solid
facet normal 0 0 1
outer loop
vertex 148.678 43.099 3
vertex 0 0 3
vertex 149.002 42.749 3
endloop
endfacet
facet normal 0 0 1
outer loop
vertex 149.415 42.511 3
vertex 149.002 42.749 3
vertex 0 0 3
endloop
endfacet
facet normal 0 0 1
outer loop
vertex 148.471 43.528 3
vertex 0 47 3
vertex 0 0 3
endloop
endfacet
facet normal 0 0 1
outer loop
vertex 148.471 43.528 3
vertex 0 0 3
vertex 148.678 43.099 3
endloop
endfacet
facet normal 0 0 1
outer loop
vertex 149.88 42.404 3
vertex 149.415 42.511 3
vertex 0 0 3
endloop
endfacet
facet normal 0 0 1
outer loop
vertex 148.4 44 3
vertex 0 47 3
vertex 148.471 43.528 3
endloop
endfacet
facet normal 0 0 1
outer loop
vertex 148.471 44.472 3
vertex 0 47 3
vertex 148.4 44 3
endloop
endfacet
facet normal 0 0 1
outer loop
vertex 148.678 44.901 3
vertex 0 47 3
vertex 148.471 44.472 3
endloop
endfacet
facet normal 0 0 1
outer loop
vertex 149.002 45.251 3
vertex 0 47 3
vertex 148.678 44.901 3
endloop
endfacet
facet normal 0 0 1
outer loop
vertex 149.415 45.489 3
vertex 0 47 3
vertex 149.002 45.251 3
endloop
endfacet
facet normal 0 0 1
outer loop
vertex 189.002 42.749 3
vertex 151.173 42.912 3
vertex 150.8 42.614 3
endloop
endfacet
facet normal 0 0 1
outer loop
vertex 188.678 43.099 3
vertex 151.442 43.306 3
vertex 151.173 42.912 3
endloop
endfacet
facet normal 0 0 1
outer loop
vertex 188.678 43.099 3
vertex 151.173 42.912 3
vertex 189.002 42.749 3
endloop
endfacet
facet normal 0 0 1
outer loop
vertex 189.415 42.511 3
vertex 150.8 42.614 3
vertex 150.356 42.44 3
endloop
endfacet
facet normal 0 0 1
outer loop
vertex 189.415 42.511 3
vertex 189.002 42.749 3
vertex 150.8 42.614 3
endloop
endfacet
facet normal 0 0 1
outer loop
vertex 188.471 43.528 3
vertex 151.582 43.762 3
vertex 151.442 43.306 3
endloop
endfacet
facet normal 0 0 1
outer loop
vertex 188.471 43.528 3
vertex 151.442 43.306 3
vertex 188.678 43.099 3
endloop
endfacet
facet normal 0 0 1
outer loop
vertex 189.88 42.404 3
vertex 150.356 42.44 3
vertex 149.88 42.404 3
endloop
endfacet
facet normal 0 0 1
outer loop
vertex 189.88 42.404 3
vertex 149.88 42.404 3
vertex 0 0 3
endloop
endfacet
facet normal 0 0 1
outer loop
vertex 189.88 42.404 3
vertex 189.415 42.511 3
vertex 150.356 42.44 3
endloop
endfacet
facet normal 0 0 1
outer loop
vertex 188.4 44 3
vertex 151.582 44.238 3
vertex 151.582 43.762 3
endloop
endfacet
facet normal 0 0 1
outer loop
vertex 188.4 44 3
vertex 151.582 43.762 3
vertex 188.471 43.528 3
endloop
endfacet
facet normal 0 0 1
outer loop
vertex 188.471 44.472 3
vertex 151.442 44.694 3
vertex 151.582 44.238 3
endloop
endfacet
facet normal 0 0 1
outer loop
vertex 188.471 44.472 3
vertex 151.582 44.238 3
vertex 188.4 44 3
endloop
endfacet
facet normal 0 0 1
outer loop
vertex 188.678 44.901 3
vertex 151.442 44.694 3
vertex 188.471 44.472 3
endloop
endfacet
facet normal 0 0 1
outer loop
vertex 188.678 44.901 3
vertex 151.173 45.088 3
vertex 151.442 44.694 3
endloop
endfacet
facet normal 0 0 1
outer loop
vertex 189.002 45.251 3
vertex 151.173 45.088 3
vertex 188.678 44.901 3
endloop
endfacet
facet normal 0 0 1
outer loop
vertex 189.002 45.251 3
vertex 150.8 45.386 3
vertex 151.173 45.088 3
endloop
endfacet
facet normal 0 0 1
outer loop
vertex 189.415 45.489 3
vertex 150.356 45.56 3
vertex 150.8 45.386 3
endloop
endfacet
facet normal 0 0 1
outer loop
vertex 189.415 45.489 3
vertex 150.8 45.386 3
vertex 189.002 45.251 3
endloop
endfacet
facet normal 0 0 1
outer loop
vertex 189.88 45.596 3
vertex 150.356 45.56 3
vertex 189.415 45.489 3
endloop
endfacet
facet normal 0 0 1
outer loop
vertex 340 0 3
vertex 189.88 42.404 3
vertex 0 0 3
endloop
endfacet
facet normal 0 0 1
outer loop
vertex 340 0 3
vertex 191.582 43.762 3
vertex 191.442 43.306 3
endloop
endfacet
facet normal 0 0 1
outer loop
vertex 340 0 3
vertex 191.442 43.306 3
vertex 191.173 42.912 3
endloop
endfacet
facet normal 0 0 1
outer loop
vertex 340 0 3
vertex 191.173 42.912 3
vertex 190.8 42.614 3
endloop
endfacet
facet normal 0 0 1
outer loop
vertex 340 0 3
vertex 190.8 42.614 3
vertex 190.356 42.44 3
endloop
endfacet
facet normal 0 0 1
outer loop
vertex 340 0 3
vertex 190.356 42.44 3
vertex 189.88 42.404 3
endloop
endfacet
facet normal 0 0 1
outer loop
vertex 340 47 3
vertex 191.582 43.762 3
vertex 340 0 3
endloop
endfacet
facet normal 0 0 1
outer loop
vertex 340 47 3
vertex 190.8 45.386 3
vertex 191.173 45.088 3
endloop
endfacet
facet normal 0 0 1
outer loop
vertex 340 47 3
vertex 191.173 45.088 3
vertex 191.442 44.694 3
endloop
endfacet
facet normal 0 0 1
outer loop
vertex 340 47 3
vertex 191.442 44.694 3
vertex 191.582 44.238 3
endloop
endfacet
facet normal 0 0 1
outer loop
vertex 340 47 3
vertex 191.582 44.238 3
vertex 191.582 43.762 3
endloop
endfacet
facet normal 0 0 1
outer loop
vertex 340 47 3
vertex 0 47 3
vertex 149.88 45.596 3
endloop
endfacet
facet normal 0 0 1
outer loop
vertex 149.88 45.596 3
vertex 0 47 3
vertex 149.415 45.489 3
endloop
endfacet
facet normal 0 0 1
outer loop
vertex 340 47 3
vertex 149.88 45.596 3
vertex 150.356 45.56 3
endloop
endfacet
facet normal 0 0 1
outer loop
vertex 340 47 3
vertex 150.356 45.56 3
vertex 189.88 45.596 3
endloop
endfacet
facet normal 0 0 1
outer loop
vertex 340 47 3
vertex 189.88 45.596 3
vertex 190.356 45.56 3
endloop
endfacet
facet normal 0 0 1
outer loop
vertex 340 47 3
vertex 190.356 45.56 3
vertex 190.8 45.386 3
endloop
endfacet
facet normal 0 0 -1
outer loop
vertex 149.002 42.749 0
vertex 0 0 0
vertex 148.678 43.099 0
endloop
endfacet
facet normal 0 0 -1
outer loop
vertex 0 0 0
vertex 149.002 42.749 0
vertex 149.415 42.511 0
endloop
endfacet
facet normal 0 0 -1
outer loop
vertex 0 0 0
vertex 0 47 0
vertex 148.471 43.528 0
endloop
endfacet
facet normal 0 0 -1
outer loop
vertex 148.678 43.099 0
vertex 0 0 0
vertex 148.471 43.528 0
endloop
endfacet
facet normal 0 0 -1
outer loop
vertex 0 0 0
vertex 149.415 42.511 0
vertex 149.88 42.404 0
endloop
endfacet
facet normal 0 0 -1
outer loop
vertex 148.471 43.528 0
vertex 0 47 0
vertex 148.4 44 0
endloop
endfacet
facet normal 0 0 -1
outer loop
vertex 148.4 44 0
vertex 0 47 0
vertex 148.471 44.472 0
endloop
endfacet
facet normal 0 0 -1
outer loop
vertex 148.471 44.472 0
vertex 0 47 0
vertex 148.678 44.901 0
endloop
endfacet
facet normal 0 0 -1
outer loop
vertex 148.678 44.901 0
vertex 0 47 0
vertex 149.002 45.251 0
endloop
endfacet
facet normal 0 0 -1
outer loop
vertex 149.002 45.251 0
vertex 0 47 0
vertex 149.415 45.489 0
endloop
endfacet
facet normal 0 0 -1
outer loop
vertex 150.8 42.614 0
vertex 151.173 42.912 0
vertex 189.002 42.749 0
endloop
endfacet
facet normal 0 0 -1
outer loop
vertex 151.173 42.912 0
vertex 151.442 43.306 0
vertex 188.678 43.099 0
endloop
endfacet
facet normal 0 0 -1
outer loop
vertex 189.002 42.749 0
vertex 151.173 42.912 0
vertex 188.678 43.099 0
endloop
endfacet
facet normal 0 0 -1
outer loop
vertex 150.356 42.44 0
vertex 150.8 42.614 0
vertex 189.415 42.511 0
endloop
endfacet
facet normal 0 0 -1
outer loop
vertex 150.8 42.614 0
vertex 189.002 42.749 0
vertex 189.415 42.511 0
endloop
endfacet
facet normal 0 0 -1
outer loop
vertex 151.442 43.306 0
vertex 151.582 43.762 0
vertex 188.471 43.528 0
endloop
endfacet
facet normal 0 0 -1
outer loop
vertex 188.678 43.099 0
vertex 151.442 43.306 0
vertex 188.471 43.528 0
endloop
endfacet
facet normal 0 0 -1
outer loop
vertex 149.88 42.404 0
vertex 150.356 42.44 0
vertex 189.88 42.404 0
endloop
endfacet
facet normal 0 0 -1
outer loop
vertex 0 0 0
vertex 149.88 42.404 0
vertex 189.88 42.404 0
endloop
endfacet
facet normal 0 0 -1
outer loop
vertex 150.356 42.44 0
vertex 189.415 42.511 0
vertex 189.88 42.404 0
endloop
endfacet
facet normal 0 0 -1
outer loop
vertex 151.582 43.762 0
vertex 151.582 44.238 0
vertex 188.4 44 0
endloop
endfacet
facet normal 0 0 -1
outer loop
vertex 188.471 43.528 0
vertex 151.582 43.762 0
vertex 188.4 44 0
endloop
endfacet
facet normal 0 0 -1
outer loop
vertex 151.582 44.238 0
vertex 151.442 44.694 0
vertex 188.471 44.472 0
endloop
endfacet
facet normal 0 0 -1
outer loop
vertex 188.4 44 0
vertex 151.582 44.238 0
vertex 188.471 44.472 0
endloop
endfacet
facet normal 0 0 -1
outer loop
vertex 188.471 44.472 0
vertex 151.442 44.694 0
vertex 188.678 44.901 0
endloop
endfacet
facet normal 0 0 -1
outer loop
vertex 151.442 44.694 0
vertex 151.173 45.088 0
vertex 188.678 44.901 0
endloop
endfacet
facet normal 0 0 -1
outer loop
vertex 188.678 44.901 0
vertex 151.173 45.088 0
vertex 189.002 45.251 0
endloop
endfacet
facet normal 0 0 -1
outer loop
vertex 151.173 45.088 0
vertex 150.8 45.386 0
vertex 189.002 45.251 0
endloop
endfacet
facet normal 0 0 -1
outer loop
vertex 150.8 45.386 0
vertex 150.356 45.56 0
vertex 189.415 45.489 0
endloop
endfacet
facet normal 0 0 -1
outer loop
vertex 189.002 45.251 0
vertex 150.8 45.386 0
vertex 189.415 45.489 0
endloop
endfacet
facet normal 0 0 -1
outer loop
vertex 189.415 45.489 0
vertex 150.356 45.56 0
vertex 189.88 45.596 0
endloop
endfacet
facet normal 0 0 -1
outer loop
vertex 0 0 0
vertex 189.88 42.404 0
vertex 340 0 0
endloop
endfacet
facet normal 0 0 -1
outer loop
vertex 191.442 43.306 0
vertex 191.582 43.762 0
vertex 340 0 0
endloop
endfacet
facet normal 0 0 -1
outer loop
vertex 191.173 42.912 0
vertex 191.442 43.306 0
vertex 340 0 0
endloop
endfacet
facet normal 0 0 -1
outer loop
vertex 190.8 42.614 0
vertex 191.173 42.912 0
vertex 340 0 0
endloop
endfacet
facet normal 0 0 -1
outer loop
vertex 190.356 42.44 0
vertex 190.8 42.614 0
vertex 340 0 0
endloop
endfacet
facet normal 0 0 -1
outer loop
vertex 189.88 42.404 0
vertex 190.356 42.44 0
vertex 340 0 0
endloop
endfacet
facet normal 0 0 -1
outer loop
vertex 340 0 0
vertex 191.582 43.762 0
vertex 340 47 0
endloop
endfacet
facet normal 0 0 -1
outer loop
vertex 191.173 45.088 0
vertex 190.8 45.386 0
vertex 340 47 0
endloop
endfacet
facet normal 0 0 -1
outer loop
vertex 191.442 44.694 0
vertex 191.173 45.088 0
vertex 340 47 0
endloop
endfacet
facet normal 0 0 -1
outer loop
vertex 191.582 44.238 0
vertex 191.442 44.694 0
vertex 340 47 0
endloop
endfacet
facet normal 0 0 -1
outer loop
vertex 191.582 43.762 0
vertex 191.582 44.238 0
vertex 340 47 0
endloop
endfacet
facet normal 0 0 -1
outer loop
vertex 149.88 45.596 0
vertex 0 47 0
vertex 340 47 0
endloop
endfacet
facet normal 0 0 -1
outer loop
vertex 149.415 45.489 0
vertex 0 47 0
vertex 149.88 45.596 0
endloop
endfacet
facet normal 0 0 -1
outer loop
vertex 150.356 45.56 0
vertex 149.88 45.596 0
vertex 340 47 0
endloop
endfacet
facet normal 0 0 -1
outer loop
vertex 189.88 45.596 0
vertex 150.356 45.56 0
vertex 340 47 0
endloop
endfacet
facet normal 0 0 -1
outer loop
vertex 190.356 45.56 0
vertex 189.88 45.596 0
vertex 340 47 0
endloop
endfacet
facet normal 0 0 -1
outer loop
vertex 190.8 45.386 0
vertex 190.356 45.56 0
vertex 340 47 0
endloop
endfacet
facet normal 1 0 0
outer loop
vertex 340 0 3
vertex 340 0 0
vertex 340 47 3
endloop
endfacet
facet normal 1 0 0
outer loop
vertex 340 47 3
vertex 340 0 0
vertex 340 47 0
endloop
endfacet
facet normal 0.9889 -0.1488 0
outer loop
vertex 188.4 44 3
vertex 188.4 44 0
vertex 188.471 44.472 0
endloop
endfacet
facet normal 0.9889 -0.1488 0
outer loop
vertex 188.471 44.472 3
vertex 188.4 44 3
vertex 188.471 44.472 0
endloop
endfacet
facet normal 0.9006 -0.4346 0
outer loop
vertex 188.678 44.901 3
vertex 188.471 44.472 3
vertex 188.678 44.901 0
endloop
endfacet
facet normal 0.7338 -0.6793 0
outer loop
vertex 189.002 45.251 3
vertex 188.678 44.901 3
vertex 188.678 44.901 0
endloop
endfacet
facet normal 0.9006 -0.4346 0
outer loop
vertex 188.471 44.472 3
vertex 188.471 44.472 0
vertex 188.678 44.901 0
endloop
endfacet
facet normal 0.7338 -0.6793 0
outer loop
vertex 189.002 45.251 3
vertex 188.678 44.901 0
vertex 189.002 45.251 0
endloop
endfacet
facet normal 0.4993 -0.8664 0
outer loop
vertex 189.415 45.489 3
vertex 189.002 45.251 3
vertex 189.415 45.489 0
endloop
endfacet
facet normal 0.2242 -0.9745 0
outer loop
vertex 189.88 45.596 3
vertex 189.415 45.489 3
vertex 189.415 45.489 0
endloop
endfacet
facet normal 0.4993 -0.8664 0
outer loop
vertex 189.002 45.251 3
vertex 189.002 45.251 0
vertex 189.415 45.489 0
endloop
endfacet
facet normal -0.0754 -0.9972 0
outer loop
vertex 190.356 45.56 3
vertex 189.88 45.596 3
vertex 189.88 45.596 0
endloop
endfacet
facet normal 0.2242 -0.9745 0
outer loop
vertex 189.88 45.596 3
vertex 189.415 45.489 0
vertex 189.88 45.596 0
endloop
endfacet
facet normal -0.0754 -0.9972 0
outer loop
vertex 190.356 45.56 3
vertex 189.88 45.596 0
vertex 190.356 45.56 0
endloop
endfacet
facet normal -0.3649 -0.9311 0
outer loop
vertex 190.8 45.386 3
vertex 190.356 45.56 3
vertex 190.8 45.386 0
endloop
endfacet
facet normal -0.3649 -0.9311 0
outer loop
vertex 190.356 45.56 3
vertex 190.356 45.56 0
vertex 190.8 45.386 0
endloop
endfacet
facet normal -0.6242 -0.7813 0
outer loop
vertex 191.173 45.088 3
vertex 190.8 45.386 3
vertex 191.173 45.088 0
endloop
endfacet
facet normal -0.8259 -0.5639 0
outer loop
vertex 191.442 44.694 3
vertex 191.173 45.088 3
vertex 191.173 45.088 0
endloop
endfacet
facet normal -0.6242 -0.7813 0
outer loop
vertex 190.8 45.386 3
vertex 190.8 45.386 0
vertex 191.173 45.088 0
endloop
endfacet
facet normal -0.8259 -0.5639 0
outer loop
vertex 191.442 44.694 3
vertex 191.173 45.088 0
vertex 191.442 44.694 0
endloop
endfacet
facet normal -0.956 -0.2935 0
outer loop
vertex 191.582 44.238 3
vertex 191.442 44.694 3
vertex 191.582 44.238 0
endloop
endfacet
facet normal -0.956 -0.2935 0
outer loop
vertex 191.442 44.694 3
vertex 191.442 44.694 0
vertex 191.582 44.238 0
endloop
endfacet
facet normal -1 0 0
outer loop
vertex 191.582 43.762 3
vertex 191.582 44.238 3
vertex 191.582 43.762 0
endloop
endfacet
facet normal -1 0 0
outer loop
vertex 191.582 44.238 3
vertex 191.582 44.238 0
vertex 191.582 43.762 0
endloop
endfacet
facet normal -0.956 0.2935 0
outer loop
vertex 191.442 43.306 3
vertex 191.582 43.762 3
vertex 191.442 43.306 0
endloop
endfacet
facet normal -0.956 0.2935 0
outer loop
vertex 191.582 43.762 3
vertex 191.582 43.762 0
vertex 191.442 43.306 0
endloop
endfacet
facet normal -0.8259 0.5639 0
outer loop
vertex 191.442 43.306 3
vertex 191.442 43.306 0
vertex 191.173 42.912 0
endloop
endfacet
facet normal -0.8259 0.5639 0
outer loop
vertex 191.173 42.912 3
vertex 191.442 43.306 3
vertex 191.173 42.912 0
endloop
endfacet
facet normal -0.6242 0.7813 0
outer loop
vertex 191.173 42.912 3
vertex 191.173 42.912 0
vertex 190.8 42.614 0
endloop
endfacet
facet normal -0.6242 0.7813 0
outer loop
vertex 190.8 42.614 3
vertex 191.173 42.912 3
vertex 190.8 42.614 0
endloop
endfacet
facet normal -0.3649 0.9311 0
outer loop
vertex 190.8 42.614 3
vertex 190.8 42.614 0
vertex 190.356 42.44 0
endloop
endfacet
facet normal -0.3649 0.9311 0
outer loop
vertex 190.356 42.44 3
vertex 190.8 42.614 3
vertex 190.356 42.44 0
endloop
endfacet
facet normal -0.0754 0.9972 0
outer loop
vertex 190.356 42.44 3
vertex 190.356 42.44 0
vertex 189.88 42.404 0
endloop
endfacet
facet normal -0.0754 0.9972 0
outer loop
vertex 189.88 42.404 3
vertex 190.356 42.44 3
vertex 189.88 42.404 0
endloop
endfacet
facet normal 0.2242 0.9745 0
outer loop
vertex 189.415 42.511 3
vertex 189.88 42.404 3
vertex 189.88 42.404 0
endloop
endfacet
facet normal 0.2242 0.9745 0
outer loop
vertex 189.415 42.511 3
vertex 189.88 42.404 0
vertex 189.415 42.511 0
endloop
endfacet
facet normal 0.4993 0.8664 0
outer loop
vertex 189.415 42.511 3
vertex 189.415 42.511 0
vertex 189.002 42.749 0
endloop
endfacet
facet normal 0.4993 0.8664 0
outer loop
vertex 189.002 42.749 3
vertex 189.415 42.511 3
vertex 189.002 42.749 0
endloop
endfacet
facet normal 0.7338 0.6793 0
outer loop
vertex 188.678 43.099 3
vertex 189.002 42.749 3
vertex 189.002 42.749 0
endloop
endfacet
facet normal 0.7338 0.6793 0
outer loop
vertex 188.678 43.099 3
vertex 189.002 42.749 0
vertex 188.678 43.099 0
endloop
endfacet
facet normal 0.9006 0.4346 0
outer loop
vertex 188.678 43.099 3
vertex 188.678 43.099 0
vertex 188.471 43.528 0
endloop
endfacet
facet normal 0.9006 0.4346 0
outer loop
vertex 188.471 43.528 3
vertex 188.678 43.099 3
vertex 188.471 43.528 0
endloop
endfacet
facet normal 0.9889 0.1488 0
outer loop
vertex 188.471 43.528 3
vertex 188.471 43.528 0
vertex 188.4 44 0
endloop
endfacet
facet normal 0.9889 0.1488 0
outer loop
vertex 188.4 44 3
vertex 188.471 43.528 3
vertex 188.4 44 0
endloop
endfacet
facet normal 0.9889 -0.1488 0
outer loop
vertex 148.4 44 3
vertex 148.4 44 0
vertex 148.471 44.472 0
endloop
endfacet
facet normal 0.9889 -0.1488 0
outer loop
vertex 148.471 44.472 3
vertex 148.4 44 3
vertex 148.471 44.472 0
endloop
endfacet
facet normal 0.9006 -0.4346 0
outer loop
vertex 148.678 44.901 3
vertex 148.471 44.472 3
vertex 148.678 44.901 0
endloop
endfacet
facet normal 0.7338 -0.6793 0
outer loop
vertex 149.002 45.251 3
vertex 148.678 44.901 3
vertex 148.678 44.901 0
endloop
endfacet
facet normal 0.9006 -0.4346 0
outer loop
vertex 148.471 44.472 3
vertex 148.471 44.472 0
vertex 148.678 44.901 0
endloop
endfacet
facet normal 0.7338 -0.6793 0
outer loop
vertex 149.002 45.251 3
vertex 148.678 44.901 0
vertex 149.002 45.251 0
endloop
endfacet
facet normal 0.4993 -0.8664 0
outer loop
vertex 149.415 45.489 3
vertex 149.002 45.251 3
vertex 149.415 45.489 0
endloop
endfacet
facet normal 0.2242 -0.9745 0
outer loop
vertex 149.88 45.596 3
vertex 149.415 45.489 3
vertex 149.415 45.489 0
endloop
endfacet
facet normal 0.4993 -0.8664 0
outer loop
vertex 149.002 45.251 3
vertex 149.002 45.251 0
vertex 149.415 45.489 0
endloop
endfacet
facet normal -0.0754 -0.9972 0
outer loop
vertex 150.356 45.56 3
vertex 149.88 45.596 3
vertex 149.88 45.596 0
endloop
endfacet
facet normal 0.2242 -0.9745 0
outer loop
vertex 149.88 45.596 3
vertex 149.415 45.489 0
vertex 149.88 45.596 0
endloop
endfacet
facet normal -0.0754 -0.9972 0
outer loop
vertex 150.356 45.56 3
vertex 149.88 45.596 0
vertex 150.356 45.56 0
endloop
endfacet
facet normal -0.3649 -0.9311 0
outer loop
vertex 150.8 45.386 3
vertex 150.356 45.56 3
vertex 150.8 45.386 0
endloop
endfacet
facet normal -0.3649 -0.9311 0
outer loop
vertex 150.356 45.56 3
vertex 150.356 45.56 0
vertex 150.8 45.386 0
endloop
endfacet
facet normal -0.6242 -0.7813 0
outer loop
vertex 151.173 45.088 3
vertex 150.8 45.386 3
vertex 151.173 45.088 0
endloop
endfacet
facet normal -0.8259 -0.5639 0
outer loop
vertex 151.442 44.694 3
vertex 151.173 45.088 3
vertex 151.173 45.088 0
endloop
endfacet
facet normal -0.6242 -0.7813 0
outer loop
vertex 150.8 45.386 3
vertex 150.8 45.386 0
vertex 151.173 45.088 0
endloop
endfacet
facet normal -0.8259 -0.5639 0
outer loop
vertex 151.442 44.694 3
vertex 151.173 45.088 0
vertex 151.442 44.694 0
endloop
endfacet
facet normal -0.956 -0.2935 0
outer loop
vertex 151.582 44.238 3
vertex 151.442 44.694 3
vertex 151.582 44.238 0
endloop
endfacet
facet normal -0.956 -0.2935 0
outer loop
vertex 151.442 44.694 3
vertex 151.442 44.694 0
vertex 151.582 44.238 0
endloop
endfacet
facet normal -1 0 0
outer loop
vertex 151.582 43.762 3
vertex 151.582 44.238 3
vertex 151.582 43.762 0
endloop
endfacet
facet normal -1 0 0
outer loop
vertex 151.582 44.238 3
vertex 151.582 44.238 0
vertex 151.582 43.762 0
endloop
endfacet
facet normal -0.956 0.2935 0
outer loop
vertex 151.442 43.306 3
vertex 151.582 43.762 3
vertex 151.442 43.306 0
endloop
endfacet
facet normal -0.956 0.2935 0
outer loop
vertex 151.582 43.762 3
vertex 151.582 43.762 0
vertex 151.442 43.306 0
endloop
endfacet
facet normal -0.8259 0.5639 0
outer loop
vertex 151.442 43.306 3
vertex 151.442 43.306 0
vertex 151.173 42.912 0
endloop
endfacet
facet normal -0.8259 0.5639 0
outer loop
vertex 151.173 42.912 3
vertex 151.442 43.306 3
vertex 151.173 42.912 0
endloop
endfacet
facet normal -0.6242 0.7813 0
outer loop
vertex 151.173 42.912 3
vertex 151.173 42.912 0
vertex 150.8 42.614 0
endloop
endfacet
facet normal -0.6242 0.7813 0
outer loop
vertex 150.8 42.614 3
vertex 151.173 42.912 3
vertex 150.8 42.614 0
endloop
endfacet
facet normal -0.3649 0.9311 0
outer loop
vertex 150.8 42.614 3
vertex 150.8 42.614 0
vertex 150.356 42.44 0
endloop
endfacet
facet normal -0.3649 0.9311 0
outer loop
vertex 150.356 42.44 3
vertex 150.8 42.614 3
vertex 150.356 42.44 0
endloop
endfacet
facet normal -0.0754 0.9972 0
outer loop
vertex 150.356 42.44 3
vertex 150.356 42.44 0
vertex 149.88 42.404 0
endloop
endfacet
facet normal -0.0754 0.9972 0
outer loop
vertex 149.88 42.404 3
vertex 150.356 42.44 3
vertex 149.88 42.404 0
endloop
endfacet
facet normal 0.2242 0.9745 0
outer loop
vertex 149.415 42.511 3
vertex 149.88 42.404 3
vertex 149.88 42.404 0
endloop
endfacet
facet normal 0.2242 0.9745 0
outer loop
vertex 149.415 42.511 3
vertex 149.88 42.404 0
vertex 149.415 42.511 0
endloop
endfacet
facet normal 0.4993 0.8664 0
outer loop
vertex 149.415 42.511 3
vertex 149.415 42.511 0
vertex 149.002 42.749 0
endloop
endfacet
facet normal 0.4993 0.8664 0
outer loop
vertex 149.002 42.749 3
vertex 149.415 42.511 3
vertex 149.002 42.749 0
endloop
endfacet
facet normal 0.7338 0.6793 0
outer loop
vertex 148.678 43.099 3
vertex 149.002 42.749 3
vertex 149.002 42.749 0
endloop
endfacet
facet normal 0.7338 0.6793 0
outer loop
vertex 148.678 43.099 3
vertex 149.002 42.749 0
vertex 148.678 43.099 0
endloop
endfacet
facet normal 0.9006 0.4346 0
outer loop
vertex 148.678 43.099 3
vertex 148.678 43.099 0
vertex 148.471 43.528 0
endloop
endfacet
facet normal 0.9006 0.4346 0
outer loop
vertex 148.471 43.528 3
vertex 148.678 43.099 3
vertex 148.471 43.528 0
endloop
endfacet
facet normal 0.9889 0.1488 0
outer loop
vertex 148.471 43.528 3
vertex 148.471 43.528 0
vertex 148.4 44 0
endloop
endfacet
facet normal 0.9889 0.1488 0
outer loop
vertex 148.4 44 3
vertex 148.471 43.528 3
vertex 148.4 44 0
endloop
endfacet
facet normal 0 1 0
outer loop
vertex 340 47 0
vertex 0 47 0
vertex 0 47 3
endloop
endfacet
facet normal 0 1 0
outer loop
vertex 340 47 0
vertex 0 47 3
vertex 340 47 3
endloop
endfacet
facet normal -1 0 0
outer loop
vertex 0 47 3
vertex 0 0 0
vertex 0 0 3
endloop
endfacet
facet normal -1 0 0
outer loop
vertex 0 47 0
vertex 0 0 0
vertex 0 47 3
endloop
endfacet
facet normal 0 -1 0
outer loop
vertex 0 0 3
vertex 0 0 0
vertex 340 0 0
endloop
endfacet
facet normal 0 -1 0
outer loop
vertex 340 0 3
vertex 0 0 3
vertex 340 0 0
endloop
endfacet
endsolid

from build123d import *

# Parameters (mm, degrees)
SKETCH1_W           = 340
SKETCH1_H           = 47
BOSS_EXTRUDE1_DEPTH = 3
CUT_EXTRUDE1_REACH  = 345.246
SKETCH2_R           = 1.6


with BuildPart() as part:
    # Sketch1 → Boss-Extrude1 (new body)
    with BuildSketch(Plane.XY):
        with Locations((170, 23.5)):
            Rectangle(SKETCH1_W, SKETCH1_H)
    extrude(amount=BOSS_EXTRUDE1_DEPTH)

    # Sketch2 → Cut-Extrude1 (cut, up to next)
    with BuildSketch(Plane(origin=(0, 0, 0), x_dir=(-1, 0, 0), z_dir=(0, 0, -1)), mode=Mode.PRIVATE) as cut_extrude1_sk1:
        with Locations((-150, 44)):
            Circle(SKETCH2_R)
    cut_extrude1_tool1 = extrude(cut_extrude1_sk1.sketch, amount=-CUT_EXTRUDE1_REACH, mode=Mode.PRIVATE) & part.part
    # Sketch2 → Cut-Extrude1 (cut, up to next)
    with BuildSketch(Plane(origin=(0, 0, 0), x_dir=(-1, 0, 0), z_dir=(0, 0, -1)), mode=Mode.PRIVATE) as cut_extrude1_sk2:
        with Locations((-190, 44)):
            Circle(SKETCH2_R)
    cut_extrude1_tool2 = extrude(cut_extrude1_sk2.sketch, amount=-CUT_EXTRUDE1_REACH, mode=Mode.PRIVATE) & part.part
    add(cut_extrude1_tool1.solids().sort_by_distance((150, 44, 0))[0], mode=Mode.SUBTRACT)
    add(cut_extrude1_tool2.solids().sort_by_distance((190, 44, 0))[0], mode=Mode.SUBTRACT)


solid = part.part
